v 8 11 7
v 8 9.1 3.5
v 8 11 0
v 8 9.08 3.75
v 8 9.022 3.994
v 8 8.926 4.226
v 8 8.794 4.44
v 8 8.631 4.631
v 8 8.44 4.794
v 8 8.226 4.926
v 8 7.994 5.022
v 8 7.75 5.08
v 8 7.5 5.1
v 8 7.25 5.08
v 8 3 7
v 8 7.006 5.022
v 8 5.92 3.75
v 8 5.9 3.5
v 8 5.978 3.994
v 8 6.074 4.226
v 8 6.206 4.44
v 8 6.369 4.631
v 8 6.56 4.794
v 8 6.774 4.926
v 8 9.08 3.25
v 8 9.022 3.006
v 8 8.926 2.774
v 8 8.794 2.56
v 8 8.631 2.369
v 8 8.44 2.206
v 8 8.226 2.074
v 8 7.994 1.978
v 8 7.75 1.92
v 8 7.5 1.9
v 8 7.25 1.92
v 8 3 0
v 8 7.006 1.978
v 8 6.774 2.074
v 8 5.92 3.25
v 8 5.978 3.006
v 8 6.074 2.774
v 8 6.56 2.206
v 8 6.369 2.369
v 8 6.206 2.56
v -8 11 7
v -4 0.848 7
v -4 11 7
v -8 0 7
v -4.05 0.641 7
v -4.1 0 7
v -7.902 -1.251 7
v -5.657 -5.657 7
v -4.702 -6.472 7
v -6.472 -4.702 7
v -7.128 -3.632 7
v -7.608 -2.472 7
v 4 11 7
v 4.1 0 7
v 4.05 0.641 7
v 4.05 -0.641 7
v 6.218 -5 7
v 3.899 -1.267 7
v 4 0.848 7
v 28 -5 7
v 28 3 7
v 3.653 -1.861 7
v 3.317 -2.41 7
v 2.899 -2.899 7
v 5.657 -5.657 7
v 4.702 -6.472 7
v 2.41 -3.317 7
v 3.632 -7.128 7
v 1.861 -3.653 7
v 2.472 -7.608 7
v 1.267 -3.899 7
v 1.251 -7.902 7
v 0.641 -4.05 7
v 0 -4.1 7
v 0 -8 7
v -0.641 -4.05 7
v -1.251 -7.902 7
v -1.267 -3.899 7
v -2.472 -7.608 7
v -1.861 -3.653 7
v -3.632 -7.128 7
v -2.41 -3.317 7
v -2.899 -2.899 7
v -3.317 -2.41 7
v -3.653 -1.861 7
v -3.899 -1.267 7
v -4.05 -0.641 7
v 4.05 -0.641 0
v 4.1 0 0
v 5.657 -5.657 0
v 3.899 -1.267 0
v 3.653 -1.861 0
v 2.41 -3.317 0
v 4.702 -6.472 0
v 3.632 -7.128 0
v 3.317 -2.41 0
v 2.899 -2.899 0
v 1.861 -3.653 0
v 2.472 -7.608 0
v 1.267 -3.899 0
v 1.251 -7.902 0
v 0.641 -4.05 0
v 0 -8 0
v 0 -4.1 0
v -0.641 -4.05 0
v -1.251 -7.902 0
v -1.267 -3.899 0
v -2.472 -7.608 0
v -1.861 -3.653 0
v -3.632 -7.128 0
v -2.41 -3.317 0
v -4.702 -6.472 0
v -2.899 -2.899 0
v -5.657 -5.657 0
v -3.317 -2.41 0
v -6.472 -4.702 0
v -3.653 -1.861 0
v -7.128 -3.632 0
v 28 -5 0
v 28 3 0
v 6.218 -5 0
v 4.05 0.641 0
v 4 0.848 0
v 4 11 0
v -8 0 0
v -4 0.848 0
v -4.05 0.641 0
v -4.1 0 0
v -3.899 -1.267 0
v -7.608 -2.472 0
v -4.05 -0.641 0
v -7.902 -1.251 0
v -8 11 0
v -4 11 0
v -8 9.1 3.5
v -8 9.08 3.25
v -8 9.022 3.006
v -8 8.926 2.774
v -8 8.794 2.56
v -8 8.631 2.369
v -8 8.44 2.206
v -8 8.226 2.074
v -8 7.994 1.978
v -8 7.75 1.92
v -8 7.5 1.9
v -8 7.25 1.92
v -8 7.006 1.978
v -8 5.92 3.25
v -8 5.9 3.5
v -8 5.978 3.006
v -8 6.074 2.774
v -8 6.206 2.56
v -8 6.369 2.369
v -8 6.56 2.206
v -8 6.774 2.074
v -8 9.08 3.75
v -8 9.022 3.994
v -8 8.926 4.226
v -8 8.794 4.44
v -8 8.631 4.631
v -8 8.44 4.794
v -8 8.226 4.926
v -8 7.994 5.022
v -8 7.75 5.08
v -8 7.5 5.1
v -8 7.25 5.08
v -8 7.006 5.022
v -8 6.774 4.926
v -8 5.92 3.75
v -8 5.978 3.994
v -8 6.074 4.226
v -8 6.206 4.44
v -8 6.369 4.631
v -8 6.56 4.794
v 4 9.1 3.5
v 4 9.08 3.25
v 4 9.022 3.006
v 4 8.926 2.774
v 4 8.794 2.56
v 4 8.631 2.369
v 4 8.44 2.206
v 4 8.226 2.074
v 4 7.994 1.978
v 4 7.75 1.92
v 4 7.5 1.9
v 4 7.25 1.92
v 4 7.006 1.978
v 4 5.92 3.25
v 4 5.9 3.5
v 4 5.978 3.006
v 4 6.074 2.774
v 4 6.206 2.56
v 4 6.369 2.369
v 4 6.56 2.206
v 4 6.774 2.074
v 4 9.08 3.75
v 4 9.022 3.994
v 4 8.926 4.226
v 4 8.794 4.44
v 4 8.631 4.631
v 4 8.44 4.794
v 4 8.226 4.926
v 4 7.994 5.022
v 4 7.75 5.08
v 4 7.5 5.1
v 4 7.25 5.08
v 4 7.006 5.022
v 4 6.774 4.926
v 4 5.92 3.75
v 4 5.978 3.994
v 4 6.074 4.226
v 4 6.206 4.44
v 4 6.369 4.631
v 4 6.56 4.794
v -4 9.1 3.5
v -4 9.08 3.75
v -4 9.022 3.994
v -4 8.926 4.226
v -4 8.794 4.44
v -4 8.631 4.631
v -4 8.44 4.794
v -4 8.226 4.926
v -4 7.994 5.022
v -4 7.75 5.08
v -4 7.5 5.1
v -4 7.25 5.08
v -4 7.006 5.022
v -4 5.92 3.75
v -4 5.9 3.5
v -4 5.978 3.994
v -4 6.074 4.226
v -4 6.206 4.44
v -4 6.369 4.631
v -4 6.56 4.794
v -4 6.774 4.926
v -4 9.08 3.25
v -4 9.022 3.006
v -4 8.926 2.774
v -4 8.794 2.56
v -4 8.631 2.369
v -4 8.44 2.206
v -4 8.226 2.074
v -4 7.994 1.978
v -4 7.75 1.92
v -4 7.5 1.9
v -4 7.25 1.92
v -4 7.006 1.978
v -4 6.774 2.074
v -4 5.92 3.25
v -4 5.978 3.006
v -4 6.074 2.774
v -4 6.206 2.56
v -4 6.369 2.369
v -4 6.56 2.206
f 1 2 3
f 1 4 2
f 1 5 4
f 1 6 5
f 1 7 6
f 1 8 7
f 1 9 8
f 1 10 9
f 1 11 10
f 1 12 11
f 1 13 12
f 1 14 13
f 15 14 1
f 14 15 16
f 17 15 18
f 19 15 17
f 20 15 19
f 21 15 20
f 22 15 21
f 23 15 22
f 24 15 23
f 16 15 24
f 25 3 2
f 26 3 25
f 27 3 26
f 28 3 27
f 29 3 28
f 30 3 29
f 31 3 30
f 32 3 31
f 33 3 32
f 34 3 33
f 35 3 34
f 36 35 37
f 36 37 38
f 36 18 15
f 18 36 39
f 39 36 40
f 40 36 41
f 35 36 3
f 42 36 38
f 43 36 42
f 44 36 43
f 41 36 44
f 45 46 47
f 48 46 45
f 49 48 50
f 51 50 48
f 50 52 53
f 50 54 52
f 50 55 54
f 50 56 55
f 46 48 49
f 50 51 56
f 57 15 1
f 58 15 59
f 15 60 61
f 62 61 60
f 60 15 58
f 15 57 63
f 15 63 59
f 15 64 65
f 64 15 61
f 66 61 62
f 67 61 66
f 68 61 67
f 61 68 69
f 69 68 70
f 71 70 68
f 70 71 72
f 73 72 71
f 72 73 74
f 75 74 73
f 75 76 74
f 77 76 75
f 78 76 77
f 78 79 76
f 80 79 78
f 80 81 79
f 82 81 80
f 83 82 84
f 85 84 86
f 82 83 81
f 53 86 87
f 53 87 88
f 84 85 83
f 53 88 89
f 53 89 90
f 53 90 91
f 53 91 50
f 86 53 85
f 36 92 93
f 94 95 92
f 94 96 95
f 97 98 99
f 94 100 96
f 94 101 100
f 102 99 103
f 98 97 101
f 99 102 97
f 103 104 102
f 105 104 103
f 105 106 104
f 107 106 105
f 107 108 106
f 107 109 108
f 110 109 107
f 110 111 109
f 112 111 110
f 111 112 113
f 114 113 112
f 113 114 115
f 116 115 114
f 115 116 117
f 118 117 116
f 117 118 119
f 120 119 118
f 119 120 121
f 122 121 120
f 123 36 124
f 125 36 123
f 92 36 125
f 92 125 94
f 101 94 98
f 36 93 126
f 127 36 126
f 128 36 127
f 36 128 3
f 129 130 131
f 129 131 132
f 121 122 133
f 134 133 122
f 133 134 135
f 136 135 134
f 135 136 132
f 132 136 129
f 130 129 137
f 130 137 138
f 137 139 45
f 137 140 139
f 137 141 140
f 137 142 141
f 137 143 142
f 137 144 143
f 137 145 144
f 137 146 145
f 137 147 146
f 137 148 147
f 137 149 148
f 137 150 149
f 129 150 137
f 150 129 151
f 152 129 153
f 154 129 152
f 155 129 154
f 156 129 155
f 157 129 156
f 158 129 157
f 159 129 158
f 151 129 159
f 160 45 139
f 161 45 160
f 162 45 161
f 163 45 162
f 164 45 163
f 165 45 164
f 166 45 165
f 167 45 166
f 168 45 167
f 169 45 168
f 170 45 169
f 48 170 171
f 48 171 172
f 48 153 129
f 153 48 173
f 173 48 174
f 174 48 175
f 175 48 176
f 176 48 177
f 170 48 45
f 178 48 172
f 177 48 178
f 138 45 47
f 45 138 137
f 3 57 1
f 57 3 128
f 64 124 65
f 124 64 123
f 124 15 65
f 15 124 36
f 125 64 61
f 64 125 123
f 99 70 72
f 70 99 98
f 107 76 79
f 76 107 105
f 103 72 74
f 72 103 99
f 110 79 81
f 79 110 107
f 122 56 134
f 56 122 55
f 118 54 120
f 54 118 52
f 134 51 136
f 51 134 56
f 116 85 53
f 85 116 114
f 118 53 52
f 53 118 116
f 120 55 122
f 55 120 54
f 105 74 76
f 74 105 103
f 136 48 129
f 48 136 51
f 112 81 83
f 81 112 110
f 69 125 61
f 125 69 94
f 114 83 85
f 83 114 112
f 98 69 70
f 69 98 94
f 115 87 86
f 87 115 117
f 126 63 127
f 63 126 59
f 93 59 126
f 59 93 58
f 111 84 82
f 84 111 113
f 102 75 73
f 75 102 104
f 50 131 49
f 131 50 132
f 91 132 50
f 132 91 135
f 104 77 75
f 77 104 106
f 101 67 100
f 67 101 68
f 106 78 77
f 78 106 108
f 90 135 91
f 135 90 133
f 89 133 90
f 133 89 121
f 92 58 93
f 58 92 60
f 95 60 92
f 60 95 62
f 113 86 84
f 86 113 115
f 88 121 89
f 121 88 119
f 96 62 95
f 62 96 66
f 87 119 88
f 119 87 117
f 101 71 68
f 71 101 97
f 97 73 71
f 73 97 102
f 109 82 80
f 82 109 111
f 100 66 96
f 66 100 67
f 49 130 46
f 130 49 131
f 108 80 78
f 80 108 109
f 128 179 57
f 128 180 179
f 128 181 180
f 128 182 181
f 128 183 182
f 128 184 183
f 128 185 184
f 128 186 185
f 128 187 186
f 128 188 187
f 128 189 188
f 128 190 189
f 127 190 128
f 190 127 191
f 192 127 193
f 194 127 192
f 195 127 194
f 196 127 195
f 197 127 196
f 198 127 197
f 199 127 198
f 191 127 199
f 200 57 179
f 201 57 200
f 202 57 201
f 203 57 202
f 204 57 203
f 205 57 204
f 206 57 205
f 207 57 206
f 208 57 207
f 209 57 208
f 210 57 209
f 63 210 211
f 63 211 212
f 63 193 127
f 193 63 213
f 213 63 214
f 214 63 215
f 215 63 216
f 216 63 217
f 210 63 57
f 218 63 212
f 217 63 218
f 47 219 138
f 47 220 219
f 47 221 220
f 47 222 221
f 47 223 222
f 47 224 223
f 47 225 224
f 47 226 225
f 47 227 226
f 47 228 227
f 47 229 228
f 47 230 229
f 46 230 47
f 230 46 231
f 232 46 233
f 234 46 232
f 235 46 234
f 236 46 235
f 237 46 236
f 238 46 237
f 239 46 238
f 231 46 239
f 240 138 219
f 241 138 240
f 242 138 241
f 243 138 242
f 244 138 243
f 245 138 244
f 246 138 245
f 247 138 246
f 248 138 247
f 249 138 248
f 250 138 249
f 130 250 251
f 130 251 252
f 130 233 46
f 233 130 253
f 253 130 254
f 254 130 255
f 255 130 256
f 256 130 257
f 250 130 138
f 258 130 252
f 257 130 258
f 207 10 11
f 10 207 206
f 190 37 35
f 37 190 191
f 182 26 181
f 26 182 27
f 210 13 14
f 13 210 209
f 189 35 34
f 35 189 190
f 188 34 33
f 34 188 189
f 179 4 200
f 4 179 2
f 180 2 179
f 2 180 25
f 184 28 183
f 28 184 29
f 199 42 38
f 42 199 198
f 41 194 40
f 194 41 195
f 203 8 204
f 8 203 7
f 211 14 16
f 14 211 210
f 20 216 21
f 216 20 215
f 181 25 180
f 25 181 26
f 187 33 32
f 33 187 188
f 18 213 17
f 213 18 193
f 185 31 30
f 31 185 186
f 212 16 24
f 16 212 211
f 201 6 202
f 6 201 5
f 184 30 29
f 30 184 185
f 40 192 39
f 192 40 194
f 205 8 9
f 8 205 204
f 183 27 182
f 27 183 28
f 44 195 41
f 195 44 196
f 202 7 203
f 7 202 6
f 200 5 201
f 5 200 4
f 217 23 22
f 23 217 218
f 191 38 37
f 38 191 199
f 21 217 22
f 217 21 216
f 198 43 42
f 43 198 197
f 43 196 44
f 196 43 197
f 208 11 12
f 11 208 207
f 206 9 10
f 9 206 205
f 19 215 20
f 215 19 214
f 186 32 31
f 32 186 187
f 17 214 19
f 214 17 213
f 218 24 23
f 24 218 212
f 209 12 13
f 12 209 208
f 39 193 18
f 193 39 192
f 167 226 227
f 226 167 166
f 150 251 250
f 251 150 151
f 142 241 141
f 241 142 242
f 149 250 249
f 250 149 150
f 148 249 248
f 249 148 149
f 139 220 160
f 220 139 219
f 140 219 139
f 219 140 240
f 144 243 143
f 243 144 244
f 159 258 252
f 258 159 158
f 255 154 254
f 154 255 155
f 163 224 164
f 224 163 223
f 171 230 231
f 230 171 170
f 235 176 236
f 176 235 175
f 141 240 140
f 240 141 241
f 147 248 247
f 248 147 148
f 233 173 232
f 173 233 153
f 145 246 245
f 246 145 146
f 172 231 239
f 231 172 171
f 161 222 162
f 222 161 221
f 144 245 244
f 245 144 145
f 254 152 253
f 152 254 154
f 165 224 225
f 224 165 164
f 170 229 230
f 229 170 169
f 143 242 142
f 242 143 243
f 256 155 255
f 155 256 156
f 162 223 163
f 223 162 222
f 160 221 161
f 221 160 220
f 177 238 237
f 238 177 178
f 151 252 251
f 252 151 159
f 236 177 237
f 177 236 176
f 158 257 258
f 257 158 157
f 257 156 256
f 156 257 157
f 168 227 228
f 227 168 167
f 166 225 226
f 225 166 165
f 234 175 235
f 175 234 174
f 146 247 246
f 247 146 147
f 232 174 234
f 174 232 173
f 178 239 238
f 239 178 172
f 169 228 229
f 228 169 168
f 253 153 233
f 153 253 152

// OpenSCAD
flesh=4;
tol=0.1;
$fn=40;
difference() {
	yhook();
	#cylinder(r=4+tol,h=17);
	translate([-4,0,0]) #cube([8,11,7]);
	rotate([0,90,0]) translate([-7/2,flesh+3.5,0]) #cylinder(r=1.5+tol,h=10);
	rotate([0,90,0]) translate([-7/2,flesh+3.5,-10]) #cylinder(r=1.5+tol,h=10);

}

module yhook(){
	translate([-8,0,0]) cube([8+2*flesh,11,7]);
	translate([0,-4-flesh+3,0]) cube([28,8,7]);
	cylinder(r=4+flesh,h=7);


}
